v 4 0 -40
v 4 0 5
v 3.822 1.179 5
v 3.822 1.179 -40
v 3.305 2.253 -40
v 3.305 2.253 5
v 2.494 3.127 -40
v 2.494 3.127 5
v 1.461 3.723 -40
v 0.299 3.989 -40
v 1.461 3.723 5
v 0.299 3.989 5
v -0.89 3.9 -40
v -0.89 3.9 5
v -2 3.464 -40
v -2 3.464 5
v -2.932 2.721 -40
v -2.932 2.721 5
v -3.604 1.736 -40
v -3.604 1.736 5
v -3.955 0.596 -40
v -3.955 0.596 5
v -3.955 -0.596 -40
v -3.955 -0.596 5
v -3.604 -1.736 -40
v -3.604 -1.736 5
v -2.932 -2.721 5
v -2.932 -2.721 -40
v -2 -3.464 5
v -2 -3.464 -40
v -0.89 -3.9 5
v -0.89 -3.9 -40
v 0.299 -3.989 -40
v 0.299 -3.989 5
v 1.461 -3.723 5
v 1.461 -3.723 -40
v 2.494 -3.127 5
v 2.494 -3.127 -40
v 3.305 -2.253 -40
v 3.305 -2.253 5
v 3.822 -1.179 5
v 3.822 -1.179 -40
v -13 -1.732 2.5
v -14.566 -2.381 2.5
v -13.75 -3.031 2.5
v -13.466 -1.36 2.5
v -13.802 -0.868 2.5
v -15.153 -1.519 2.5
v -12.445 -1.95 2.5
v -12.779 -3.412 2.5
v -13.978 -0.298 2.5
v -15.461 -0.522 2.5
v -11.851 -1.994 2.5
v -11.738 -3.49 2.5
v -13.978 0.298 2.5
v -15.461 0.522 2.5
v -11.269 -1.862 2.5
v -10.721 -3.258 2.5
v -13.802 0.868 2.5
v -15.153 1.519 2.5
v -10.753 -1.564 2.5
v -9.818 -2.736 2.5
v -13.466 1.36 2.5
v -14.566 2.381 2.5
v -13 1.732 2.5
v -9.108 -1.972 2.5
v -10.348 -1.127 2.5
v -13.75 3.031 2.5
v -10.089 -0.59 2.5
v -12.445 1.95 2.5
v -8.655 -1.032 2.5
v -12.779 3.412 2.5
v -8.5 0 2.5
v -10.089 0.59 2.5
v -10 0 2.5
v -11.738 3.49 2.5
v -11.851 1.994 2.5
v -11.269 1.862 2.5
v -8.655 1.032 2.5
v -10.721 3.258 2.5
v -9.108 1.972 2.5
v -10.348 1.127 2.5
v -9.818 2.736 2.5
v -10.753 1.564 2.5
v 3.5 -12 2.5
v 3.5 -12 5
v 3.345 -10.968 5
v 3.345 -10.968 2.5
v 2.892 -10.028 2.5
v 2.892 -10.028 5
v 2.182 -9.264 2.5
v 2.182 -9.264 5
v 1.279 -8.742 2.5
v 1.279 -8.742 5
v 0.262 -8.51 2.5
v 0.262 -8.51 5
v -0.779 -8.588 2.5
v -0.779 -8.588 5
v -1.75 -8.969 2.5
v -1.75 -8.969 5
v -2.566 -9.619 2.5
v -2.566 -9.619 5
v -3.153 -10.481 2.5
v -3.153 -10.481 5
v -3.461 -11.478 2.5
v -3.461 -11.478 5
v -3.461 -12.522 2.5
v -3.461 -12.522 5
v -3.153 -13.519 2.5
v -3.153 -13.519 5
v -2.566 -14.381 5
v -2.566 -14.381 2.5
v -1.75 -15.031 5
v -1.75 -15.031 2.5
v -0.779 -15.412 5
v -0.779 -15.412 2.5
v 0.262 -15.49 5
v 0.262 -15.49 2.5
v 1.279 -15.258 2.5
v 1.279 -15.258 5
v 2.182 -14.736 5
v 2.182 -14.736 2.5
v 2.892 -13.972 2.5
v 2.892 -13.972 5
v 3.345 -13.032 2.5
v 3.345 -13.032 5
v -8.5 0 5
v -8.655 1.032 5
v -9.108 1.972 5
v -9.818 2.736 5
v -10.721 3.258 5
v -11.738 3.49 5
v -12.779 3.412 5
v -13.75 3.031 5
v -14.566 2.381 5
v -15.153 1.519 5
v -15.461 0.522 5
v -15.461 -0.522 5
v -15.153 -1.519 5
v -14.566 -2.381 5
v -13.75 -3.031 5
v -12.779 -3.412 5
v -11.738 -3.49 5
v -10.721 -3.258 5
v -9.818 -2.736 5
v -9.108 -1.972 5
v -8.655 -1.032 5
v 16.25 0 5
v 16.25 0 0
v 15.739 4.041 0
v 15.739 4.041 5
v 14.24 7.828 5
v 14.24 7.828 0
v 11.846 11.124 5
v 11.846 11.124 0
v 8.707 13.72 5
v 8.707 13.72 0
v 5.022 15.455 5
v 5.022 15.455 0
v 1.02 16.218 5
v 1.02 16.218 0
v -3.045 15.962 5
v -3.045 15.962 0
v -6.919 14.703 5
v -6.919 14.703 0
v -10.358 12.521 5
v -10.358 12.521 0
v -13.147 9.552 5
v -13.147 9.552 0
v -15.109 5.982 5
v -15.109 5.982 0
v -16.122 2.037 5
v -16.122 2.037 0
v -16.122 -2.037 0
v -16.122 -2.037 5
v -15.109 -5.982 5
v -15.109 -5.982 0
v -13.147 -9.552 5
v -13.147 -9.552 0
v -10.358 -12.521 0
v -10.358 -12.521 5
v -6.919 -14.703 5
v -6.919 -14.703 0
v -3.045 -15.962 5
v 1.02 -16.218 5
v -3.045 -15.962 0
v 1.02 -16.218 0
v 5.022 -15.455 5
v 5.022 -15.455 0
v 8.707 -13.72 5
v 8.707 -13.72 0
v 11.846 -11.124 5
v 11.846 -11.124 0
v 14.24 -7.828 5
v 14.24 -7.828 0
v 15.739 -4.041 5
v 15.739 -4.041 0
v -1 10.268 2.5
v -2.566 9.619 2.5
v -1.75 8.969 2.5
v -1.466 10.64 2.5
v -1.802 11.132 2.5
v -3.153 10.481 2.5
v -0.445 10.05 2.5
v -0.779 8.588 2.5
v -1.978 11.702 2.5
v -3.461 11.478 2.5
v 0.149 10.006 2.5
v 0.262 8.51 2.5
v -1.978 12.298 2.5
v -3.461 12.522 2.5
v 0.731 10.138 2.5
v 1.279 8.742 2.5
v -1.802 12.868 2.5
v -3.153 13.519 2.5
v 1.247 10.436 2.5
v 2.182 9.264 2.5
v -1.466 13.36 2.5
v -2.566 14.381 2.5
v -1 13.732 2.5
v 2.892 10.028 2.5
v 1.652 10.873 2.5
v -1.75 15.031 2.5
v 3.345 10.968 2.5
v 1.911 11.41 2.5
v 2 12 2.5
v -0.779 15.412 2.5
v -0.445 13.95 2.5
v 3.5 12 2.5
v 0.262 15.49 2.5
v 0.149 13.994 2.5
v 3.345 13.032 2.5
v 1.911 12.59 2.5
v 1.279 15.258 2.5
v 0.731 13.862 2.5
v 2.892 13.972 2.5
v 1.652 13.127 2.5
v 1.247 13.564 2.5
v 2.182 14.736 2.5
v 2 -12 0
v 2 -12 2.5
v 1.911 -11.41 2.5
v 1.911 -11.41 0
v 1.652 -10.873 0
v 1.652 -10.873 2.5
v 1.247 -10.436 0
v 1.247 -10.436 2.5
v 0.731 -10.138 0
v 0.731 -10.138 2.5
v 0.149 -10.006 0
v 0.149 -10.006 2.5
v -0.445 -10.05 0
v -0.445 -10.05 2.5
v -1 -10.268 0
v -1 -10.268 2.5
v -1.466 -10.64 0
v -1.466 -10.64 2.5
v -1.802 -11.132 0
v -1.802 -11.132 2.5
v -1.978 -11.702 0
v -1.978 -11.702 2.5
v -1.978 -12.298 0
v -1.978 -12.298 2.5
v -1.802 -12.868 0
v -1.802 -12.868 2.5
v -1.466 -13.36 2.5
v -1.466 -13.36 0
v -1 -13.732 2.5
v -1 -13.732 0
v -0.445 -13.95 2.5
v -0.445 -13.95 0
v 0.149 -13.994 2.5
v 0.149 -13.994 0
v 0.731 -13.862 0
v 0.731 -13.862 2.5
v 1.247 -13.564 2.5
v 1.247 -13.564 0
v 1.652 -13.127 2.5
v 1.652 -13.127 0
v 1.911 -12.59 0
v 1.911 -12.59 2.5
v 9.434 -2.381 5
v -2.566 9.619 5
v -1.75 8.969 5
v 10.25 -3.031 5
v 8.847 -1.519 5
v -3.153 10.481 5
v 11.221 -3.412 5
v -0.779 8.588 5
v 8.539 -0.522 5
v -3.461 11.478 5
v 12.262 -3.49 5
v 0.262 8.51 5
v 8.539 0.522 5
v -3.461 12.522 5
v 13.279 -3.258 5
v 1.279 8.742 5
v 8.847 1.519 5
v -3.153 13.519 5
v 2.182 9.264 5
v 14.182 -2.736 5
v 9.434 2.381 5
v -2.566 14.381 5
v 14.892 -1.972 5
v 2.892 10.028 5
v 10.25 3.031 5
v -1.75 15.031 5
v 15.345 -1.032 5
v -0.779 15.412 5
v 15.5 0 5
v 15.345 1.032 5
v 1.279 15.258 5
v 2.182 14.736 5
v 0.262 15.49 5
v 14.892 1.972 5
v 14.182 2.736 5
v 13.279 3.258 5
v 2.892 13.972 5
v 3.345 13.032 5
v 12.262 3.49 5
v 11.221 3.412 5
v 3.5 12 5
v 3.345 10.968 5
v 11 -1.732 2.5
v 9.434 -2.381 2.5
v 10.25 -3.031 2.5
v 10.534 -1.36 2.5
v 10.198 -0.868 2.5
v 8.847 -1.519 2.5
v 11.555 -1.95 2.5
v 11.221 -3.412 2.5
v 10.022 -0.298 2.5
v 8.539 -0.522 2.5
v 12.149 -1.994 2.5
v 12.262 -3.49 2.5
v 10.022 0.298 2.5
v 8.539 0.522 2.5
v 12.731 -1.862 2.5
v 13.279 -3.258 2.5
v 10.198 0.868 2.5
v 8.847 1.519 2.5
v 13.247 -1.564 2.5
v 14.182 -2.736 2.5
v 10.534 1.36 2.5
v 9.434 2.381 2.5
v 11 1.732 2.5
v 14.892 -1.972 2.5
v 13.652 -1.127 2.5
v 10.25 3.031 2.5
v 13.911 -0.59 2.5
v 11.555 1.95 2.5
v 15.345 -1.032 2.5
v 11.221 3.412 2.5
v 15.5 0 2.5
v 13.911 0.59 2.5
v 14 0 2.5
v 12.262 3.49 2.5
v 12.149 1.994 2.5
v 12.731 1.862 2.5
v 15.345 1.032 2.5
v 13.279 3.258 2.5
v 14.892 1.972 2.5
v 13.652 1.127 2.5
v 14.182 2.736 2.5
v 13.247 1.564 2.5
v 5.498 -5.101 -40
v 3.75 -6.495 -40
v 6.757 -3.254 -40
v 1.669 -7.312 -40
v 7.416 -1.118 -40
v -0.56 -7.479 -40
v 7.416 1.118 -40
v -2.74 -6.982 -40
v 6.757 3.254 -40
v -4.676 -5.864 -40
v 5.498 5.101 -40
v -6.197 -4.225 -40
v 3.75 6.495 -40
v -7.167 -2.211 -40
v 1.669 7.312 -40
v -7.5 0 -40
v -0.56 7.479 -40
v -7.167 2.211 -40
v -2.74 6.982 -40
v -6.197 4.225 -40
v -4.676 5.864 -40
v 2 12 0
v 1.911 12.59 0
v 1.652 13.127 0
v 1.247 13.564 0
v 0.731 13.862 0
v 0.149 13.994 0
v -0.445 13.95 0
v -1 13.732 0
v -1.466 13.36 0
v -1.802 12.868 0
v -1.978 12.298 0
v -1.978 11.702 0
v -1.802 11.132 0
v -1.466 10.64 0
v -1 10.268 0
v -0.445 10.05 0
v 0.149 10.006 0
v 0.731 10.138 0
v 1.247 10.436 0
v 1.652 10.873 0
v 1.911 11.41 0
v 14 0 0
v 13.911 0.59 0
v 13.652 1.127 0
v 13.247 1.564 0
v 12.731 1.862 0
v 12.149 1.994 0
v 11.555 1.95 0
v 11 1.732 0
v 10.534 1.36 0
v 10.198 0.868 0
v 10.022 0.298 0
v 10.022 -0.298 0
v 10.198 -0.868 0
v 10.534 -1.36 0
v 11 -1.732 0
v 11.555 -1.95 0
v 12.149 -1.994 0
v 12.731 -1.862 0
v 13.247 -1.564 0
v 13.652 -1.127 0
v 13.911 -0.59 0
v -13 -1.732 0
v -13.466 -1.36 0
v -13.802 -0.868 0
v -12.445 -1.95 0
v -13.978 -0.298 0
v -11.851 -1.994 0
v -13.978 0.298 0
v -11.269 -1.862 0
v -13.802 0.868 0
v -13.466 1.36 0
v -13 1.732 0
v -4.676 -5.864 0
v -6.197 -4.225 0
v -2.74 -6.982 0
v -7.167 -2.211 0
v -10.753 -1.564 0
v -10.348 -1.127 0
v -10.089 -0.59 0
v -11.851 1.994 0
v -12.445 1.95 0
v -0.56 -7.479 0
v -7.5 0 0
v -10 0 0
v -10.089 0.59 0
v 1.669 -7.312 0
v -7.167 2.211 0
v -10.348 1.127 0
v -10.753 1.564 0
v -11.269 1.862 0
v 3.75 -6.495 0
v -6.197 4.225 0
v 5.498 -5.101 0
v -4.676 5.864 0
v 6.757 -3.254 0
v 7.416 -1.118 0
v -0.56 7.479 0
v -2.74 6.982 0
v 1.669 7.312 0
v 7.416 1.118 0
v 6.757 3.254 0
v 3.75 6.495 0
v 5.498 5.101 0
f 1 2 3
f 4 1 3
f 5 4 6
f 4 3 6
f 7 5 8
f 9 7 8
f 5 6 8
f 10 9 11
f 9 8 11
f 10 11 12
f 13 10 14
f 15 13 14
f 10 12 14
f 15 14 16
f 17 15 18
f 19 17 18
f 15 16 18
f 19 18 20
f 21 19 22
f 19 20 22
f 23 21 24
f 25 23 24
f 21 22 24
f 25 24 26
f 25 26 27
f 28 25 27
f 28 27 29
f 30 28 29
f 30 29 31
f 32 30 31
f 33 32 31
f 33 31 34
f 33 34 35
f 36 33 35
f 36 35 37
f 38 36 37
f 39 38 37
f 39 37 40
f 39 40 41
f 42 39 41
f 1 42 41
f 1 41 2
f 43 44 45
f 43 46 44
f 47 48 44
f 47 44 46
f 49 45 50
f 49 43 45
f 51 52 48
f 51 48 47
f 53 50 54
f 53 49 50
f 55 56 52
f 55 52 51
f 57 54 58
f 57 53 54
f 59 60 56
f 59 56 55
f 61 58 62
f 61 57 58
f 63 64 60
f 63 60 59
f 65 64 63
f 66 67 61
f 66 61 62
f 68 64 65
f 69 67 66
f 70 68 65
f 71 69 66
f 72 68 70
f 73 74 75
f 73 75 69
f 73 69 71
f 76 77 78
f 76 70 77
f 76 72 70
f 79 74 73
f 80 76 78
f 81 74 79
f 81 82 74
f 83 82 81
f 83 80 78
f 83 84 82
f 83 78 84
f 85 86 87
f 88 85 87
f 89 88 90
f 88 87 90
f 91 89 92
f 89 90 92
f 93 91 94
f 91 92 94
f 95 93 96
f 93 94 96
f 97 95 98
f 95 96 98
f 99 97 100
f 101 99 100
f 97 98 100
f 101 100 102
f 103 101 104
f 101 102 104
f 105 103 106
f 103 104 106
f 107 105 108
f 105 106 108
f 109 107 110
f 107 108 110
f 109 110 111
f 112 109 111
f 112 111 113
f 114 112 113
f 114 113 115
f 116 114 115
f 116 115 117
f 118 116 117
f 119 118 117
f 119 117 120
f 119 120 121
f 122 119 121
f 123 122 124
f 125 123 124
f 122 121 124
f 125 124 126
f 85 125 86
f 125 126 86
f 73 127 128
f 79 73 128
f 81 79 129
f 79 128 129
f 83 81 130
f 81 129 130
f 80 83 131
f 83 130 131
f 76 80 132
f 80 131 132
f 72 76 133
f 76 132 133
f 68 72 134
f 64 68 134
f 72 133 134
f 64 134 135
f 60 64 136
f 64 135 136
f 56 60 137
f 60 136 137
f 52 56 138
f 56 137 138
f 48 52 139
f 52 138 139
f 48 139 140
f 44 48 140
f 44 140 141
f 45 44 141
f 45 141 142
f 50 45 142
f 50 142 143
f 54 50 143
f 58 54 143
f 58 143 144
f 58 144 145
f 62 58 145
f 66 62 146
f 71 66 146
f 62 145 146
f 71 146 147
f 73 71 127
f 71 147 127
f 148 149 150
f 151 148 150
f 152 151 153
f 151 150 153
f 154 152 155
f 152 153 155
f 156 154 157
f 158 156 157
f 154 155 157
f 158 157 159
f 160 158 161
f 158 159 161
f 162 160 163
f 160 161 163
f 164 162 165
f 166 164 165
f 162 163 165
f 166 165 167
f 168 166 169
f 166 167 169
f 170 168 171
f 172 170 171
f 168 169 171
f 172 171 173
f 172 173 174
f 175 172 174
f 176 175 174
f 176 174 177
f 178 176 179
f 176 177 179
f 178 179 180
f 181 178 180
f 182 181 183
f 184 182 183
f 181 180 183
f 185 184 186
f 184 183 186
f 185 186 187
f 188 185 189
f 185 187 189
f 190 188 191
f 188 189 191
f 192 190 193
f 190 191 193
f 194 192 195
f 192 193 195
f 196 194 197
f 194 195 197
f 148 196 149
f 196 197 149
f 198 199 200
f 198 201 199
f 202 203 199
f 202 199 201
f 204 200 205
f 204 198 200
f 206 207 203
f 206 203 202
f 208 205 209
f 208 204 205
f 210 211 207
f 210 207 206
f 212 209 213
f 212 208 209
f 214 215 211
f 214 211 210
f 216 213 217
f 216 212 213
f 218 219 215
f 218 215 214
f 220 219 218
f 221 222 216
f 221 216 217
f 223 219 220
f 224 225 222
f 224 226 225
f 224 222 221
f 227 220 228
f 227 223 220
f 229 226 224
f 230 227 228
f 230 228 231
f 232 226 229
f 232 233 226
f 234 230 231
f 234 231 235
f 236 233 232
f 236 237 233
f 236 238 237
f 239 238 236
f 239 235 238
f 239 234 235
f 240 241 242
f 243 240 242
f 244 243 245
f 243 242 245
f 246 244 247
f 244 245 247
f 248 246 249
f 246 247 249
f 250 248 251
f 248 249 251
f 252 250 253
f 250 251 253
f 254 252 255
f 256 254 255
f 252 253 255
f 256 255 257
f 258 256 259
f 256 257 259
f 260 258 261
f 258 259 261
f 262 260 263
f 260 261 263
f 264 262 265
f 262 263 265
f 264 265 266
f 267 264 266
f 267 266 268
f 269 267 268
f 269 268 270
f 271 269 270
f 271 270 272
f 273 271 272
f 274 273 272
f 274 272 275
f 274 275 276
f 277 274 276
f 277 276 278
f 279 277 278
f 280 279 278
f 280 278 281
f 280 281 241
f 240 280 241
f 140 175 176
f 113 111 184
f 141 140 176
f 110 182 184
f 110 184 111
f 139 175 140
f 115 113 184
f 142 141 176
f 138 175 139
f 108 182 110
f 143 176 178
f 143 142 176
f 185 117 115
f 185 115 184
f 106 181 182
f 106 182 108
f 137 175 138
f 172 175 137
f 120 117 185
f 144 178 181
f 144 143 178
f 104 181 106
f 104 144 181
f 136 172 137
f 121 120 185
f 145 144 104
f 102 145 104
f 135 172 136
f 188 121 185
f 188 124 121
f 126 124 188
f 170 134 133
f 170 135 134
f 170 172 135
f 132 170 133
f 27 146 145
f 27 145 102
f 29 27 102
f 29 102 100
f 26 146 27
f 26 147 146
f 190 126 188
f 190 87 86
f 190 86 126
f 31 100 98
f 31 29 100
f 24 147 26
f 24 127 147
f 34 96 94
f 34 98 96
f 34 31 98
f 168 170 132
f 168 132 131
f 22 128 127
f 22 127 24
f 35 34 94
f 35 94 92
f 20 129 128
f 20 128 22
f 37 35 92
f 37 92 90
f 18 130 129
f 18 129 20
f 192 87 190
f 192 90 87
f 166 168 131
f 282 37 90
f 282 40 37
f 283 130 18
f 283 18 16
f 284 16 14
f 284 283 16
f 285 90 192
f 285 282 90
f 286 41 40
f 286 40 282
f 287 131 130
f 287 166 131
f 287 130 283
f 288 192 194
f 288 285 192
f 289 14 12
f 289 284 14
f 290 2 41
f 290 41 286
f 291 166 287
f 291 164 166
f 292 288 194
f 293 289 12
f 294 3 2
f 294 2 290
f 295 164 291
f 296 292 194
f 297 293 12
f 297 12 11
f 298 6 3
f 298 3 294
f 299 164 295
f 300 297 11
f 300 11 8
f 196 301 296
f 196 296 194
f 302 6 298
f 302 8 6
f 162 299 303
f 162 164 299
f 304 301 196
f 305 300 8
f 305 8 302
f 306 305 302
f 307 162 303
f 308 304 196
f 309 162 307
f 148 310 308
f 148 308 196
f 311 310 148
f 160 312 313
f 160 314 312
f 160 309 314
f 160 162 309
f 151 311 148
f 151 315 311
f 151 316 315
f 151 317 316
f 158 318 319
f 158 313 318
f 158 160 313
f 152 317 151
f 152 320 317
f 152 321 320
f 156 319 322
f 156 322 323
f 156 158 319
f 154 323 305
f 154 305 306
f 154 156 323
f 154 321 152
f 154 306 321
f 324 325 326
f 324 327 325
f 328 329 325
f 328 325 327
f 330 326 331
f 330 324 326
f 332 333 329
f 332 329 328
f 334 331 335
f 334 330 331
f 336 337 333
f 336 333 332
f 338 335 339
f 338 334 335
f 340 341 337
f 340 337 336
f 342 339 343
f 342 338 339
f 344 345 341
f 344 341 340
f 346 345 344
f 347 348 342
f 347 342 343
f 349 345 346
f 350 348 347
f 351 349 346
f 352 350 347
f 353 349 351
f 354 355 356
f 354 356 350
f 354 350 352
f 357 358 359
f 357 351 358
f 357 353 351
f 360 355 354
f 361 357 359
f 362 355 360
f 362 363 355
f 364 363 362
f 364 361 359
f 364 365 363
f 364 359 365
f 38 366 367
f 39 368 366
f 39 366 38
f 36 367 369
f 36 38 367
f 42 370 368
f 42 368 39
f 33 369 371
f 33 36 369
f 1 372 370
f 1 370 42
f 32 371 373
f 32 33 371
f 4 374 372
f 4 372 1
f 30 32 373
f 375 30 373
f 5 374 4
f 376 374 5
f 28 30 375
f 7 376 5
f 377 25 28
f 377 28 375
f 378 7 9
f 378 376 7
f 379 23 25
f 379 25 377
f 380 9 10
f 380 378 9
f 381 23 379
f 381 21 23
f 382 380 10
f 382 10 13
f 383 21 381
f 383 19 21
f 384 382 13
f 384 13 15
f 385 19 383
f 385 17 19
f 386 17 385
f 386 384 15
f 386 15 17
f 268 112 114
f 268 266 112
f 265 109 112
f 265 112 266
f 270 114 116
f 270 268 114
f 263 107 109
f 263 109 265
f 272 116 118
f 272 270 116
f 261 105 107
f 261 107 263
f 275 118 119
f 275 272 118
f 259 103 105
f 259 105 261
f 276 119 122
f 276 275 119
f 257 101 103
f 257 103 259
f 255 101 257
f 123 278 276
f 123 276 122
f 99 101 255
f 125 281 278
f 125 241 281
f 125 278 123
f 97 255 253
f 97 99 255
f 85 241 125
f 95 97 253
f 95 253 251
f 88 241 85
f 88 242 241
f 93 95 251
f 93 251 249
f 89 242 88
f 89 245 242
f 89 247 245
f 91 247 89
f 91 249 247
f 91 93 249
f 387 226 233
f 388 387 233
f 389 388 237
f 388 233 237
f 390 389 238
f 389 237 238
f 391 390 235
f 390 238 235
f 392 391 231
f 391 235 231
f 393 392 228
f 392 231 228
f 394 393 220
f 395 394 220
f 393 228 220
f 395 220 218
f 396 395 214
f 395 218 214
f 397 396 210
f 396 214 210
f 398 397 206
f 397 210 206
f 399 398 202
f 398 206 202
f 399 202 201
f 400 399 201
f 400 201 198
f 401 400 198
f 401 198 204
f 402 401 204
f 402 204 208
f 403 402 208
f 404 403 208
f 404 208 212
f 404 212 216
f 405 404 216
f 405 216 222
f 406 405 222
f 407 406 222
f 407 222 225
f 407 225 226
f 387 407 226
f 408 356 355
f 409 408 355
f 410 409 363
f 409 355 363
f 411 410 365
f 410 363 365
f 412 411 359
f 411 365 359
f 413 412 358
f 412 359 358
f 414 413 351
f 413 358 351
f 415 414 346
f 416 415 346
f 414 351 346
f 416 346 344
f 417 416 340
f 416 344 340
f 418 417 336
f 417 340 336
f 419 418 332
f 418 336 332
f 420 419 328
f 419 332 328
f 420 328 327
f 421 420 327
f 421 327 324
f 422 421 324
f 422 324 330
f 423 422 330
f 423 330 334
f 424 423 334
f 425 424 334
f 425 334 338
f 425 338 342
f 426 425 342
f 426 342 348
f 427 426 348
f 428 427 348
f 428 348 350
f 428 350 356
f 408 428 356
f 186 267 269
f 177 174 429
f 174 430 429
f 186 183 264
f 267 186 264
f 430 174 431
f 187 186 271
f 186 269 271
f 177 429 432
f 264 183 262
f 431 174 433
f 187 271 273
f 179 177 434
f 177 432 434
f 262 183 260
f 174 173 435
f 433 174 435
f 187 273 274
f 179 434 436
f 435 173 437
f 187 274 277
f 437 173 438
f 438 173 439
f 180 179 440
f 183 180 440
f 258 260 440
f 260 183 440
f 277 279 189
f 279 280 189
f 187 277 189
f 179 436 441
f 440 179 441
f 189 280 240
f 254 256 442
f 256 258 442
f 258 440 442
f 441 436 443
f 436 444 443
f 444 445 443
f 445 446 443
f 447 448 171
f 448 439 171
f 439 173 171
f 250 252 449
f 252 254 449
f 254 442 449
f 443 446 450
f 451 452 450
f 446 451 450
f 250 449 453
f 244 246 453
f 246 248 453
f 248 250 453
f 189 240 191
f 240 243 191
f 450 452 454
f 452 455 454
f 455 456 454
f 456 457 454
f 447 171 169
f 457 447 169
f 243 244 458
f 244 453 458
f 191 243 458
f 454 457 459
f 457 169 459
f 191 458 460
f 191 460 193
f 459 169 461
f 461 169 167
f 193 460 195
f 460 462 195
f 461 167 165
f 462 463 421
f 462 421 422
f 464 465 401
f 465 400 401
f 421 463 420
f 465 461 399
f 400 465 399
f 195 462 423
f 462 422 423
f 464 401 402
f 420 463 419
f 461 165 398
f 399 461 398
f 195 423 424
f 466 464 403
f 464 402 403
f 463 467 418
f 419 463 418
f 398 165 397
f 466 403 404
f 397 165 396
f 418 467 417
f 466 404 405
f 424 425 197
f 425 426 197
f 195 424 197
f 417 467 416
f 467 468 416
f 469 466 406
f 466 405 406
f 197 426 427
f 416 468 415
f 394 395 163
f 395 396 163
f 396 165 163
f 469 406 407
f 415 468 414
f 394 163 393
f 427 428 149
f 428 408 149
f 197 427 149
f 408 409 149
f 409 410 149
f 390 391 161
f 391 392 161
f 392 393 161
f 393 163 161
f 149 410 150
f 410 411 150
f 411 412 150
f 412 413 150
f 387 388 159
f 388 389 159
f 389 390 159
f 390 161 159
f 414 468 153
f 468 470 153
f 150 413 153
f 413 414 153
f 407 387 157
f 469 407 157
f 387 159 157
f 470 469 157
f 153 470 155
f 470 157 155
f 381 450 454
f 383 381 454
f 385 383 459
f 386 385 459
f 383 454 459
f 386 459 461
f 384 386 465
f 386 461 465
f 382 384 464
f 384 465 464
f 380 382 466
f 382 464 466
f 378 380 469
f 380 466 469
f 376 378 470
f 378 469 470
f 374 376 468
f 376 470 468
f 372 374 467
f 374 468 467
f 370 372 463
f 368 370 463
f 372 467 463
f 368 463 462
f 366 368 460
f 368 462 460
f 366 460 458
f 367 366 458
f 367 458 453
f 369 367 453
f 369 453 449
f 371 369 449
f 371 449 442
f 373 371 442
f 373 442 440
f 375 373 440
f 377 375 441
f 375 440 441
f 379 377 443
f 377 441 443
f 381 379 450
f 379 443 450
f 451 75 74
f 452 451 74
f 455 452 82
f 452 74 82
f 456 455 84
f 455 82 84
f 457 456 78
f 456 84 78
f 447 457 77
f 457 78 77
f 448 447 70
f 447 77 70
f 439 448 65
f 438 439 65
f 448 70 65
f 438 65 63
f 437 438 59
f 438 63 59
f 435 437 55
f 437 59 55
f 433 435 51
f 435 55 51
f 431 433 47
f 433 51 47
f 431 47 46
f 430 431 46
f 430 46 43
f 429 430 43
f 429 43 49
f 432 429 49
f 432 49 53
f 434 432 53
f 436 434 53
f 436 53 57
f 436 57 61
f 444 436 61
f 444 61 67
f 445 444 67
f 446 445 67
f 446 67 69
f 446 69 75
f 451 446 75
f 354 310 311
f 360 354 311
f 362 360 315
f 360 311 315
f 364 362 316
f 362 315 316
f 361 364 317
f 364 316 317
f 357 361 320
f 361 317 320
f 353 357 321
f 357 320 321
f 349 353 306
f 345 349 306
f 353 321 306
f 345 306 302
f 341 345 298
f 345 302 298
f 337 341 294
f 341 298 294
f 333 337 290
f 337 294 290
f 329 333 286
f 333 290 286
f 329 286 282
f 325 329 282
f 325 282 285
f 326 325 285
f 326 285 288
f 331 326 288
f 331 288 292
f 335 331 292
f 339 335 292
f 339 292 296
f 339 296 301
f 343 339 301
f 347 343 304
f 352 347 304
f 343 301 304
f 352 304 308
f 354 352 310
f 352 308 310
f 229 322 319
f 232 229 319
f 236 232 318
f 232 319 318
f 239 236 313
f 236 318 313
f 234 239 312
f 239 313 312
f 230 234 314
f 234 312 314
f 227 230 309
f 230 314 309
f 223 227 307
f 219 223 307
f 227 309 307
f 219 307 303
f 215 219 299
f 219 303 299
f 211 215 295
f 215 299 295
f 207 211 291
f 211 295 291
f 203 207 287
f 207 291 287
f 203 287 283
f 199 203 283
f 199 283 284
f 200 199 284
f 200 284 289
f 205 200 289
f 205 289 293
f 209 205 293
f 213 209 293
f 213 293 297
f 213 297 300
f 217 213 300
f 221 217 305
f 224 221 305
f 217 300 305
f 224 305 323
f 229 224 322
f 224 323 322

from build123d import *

# Parameters (mm, degrees)
SKETCH1_R           = 16.25
BOSS_EXTRUDE1_DEPTH = 5
SKETCH2_R           = 3.5
CUT_EXTRUDE1_DEPTH  = 2.5
SKETCH3_R           = 7.5
BOSS_EXTRUDE2_DEPTH = 40
SKETCH4_R           = 4
CUT_EXTRUDE2_DEPTH  = 46
SKETCH5_R           = 2
CUT_EXTRUDE3_DEPTH  = 43.5


with BuildPart() as part:
    # Sketch1 → Boss-Extrude1 (new body)
    with BuildSketch(Plane.XY):
        Circle(SKETCH1_R)
    extrude(amount=BOSS_EXTRUDE1_DEPTH)

    # Sketch2 → Cut-Extrude1 (cut)
    with BuildSketch(Plane.XY.offset(5)):
        with Locations((0, 12)):
            Circle(SKETCH2_R)
        with Locations((12, 0)):
            Circle(SKETCH2_R)
        with Locations((0, -12)):
            Circle(SKETCH2_R)
        with Locations((-12, 0)):
            Circle(SKETCH2_R)
    extrude(amount=-CUT_EXTRUDE1_DEPTH, mode=Mode.SUBTRACT)

    # Sketch3 → Boss-Extrude2 (add)
    with BuildSketch(Plane(origin=(0, 0, 0), x_dir=(-1, 0, 0), z_dir=(0, 0, -1))):
        Circle(SKETCH3_R)
    extrude(amount=BOSS_EXTRUDE2_DEPTH)

    # Sketch4 → Cut-Extrude2 (cut, through all)
    with BuildSketch(Plane.XY.offset(5)):
        Circle(SKETCH4_R)
    extrude(amount=-CUT_EXTRUDE2_DEPTH, mode=Mode.SUBTRACT)

    # Sketch5 → Cut-Extrude3 (cut, through all)
    with BuildSketch(Plane.XY.offset(2.5)):
        with Locations((12, 0)):
            Circle(SKETCH5_R)
        with Locations((0, -12)):
            Circle(SKETCH5_R)
        with Locations((-12, 0)):
            Circle(SKETCH5_R)
        with Locations((0, 12)):
            Circle(SKETCH5_R)
    extrude(amount=-CUT_EXTRUDE3_DEPTH, mode=Mode.SUBTRACT)


solid = part.part
